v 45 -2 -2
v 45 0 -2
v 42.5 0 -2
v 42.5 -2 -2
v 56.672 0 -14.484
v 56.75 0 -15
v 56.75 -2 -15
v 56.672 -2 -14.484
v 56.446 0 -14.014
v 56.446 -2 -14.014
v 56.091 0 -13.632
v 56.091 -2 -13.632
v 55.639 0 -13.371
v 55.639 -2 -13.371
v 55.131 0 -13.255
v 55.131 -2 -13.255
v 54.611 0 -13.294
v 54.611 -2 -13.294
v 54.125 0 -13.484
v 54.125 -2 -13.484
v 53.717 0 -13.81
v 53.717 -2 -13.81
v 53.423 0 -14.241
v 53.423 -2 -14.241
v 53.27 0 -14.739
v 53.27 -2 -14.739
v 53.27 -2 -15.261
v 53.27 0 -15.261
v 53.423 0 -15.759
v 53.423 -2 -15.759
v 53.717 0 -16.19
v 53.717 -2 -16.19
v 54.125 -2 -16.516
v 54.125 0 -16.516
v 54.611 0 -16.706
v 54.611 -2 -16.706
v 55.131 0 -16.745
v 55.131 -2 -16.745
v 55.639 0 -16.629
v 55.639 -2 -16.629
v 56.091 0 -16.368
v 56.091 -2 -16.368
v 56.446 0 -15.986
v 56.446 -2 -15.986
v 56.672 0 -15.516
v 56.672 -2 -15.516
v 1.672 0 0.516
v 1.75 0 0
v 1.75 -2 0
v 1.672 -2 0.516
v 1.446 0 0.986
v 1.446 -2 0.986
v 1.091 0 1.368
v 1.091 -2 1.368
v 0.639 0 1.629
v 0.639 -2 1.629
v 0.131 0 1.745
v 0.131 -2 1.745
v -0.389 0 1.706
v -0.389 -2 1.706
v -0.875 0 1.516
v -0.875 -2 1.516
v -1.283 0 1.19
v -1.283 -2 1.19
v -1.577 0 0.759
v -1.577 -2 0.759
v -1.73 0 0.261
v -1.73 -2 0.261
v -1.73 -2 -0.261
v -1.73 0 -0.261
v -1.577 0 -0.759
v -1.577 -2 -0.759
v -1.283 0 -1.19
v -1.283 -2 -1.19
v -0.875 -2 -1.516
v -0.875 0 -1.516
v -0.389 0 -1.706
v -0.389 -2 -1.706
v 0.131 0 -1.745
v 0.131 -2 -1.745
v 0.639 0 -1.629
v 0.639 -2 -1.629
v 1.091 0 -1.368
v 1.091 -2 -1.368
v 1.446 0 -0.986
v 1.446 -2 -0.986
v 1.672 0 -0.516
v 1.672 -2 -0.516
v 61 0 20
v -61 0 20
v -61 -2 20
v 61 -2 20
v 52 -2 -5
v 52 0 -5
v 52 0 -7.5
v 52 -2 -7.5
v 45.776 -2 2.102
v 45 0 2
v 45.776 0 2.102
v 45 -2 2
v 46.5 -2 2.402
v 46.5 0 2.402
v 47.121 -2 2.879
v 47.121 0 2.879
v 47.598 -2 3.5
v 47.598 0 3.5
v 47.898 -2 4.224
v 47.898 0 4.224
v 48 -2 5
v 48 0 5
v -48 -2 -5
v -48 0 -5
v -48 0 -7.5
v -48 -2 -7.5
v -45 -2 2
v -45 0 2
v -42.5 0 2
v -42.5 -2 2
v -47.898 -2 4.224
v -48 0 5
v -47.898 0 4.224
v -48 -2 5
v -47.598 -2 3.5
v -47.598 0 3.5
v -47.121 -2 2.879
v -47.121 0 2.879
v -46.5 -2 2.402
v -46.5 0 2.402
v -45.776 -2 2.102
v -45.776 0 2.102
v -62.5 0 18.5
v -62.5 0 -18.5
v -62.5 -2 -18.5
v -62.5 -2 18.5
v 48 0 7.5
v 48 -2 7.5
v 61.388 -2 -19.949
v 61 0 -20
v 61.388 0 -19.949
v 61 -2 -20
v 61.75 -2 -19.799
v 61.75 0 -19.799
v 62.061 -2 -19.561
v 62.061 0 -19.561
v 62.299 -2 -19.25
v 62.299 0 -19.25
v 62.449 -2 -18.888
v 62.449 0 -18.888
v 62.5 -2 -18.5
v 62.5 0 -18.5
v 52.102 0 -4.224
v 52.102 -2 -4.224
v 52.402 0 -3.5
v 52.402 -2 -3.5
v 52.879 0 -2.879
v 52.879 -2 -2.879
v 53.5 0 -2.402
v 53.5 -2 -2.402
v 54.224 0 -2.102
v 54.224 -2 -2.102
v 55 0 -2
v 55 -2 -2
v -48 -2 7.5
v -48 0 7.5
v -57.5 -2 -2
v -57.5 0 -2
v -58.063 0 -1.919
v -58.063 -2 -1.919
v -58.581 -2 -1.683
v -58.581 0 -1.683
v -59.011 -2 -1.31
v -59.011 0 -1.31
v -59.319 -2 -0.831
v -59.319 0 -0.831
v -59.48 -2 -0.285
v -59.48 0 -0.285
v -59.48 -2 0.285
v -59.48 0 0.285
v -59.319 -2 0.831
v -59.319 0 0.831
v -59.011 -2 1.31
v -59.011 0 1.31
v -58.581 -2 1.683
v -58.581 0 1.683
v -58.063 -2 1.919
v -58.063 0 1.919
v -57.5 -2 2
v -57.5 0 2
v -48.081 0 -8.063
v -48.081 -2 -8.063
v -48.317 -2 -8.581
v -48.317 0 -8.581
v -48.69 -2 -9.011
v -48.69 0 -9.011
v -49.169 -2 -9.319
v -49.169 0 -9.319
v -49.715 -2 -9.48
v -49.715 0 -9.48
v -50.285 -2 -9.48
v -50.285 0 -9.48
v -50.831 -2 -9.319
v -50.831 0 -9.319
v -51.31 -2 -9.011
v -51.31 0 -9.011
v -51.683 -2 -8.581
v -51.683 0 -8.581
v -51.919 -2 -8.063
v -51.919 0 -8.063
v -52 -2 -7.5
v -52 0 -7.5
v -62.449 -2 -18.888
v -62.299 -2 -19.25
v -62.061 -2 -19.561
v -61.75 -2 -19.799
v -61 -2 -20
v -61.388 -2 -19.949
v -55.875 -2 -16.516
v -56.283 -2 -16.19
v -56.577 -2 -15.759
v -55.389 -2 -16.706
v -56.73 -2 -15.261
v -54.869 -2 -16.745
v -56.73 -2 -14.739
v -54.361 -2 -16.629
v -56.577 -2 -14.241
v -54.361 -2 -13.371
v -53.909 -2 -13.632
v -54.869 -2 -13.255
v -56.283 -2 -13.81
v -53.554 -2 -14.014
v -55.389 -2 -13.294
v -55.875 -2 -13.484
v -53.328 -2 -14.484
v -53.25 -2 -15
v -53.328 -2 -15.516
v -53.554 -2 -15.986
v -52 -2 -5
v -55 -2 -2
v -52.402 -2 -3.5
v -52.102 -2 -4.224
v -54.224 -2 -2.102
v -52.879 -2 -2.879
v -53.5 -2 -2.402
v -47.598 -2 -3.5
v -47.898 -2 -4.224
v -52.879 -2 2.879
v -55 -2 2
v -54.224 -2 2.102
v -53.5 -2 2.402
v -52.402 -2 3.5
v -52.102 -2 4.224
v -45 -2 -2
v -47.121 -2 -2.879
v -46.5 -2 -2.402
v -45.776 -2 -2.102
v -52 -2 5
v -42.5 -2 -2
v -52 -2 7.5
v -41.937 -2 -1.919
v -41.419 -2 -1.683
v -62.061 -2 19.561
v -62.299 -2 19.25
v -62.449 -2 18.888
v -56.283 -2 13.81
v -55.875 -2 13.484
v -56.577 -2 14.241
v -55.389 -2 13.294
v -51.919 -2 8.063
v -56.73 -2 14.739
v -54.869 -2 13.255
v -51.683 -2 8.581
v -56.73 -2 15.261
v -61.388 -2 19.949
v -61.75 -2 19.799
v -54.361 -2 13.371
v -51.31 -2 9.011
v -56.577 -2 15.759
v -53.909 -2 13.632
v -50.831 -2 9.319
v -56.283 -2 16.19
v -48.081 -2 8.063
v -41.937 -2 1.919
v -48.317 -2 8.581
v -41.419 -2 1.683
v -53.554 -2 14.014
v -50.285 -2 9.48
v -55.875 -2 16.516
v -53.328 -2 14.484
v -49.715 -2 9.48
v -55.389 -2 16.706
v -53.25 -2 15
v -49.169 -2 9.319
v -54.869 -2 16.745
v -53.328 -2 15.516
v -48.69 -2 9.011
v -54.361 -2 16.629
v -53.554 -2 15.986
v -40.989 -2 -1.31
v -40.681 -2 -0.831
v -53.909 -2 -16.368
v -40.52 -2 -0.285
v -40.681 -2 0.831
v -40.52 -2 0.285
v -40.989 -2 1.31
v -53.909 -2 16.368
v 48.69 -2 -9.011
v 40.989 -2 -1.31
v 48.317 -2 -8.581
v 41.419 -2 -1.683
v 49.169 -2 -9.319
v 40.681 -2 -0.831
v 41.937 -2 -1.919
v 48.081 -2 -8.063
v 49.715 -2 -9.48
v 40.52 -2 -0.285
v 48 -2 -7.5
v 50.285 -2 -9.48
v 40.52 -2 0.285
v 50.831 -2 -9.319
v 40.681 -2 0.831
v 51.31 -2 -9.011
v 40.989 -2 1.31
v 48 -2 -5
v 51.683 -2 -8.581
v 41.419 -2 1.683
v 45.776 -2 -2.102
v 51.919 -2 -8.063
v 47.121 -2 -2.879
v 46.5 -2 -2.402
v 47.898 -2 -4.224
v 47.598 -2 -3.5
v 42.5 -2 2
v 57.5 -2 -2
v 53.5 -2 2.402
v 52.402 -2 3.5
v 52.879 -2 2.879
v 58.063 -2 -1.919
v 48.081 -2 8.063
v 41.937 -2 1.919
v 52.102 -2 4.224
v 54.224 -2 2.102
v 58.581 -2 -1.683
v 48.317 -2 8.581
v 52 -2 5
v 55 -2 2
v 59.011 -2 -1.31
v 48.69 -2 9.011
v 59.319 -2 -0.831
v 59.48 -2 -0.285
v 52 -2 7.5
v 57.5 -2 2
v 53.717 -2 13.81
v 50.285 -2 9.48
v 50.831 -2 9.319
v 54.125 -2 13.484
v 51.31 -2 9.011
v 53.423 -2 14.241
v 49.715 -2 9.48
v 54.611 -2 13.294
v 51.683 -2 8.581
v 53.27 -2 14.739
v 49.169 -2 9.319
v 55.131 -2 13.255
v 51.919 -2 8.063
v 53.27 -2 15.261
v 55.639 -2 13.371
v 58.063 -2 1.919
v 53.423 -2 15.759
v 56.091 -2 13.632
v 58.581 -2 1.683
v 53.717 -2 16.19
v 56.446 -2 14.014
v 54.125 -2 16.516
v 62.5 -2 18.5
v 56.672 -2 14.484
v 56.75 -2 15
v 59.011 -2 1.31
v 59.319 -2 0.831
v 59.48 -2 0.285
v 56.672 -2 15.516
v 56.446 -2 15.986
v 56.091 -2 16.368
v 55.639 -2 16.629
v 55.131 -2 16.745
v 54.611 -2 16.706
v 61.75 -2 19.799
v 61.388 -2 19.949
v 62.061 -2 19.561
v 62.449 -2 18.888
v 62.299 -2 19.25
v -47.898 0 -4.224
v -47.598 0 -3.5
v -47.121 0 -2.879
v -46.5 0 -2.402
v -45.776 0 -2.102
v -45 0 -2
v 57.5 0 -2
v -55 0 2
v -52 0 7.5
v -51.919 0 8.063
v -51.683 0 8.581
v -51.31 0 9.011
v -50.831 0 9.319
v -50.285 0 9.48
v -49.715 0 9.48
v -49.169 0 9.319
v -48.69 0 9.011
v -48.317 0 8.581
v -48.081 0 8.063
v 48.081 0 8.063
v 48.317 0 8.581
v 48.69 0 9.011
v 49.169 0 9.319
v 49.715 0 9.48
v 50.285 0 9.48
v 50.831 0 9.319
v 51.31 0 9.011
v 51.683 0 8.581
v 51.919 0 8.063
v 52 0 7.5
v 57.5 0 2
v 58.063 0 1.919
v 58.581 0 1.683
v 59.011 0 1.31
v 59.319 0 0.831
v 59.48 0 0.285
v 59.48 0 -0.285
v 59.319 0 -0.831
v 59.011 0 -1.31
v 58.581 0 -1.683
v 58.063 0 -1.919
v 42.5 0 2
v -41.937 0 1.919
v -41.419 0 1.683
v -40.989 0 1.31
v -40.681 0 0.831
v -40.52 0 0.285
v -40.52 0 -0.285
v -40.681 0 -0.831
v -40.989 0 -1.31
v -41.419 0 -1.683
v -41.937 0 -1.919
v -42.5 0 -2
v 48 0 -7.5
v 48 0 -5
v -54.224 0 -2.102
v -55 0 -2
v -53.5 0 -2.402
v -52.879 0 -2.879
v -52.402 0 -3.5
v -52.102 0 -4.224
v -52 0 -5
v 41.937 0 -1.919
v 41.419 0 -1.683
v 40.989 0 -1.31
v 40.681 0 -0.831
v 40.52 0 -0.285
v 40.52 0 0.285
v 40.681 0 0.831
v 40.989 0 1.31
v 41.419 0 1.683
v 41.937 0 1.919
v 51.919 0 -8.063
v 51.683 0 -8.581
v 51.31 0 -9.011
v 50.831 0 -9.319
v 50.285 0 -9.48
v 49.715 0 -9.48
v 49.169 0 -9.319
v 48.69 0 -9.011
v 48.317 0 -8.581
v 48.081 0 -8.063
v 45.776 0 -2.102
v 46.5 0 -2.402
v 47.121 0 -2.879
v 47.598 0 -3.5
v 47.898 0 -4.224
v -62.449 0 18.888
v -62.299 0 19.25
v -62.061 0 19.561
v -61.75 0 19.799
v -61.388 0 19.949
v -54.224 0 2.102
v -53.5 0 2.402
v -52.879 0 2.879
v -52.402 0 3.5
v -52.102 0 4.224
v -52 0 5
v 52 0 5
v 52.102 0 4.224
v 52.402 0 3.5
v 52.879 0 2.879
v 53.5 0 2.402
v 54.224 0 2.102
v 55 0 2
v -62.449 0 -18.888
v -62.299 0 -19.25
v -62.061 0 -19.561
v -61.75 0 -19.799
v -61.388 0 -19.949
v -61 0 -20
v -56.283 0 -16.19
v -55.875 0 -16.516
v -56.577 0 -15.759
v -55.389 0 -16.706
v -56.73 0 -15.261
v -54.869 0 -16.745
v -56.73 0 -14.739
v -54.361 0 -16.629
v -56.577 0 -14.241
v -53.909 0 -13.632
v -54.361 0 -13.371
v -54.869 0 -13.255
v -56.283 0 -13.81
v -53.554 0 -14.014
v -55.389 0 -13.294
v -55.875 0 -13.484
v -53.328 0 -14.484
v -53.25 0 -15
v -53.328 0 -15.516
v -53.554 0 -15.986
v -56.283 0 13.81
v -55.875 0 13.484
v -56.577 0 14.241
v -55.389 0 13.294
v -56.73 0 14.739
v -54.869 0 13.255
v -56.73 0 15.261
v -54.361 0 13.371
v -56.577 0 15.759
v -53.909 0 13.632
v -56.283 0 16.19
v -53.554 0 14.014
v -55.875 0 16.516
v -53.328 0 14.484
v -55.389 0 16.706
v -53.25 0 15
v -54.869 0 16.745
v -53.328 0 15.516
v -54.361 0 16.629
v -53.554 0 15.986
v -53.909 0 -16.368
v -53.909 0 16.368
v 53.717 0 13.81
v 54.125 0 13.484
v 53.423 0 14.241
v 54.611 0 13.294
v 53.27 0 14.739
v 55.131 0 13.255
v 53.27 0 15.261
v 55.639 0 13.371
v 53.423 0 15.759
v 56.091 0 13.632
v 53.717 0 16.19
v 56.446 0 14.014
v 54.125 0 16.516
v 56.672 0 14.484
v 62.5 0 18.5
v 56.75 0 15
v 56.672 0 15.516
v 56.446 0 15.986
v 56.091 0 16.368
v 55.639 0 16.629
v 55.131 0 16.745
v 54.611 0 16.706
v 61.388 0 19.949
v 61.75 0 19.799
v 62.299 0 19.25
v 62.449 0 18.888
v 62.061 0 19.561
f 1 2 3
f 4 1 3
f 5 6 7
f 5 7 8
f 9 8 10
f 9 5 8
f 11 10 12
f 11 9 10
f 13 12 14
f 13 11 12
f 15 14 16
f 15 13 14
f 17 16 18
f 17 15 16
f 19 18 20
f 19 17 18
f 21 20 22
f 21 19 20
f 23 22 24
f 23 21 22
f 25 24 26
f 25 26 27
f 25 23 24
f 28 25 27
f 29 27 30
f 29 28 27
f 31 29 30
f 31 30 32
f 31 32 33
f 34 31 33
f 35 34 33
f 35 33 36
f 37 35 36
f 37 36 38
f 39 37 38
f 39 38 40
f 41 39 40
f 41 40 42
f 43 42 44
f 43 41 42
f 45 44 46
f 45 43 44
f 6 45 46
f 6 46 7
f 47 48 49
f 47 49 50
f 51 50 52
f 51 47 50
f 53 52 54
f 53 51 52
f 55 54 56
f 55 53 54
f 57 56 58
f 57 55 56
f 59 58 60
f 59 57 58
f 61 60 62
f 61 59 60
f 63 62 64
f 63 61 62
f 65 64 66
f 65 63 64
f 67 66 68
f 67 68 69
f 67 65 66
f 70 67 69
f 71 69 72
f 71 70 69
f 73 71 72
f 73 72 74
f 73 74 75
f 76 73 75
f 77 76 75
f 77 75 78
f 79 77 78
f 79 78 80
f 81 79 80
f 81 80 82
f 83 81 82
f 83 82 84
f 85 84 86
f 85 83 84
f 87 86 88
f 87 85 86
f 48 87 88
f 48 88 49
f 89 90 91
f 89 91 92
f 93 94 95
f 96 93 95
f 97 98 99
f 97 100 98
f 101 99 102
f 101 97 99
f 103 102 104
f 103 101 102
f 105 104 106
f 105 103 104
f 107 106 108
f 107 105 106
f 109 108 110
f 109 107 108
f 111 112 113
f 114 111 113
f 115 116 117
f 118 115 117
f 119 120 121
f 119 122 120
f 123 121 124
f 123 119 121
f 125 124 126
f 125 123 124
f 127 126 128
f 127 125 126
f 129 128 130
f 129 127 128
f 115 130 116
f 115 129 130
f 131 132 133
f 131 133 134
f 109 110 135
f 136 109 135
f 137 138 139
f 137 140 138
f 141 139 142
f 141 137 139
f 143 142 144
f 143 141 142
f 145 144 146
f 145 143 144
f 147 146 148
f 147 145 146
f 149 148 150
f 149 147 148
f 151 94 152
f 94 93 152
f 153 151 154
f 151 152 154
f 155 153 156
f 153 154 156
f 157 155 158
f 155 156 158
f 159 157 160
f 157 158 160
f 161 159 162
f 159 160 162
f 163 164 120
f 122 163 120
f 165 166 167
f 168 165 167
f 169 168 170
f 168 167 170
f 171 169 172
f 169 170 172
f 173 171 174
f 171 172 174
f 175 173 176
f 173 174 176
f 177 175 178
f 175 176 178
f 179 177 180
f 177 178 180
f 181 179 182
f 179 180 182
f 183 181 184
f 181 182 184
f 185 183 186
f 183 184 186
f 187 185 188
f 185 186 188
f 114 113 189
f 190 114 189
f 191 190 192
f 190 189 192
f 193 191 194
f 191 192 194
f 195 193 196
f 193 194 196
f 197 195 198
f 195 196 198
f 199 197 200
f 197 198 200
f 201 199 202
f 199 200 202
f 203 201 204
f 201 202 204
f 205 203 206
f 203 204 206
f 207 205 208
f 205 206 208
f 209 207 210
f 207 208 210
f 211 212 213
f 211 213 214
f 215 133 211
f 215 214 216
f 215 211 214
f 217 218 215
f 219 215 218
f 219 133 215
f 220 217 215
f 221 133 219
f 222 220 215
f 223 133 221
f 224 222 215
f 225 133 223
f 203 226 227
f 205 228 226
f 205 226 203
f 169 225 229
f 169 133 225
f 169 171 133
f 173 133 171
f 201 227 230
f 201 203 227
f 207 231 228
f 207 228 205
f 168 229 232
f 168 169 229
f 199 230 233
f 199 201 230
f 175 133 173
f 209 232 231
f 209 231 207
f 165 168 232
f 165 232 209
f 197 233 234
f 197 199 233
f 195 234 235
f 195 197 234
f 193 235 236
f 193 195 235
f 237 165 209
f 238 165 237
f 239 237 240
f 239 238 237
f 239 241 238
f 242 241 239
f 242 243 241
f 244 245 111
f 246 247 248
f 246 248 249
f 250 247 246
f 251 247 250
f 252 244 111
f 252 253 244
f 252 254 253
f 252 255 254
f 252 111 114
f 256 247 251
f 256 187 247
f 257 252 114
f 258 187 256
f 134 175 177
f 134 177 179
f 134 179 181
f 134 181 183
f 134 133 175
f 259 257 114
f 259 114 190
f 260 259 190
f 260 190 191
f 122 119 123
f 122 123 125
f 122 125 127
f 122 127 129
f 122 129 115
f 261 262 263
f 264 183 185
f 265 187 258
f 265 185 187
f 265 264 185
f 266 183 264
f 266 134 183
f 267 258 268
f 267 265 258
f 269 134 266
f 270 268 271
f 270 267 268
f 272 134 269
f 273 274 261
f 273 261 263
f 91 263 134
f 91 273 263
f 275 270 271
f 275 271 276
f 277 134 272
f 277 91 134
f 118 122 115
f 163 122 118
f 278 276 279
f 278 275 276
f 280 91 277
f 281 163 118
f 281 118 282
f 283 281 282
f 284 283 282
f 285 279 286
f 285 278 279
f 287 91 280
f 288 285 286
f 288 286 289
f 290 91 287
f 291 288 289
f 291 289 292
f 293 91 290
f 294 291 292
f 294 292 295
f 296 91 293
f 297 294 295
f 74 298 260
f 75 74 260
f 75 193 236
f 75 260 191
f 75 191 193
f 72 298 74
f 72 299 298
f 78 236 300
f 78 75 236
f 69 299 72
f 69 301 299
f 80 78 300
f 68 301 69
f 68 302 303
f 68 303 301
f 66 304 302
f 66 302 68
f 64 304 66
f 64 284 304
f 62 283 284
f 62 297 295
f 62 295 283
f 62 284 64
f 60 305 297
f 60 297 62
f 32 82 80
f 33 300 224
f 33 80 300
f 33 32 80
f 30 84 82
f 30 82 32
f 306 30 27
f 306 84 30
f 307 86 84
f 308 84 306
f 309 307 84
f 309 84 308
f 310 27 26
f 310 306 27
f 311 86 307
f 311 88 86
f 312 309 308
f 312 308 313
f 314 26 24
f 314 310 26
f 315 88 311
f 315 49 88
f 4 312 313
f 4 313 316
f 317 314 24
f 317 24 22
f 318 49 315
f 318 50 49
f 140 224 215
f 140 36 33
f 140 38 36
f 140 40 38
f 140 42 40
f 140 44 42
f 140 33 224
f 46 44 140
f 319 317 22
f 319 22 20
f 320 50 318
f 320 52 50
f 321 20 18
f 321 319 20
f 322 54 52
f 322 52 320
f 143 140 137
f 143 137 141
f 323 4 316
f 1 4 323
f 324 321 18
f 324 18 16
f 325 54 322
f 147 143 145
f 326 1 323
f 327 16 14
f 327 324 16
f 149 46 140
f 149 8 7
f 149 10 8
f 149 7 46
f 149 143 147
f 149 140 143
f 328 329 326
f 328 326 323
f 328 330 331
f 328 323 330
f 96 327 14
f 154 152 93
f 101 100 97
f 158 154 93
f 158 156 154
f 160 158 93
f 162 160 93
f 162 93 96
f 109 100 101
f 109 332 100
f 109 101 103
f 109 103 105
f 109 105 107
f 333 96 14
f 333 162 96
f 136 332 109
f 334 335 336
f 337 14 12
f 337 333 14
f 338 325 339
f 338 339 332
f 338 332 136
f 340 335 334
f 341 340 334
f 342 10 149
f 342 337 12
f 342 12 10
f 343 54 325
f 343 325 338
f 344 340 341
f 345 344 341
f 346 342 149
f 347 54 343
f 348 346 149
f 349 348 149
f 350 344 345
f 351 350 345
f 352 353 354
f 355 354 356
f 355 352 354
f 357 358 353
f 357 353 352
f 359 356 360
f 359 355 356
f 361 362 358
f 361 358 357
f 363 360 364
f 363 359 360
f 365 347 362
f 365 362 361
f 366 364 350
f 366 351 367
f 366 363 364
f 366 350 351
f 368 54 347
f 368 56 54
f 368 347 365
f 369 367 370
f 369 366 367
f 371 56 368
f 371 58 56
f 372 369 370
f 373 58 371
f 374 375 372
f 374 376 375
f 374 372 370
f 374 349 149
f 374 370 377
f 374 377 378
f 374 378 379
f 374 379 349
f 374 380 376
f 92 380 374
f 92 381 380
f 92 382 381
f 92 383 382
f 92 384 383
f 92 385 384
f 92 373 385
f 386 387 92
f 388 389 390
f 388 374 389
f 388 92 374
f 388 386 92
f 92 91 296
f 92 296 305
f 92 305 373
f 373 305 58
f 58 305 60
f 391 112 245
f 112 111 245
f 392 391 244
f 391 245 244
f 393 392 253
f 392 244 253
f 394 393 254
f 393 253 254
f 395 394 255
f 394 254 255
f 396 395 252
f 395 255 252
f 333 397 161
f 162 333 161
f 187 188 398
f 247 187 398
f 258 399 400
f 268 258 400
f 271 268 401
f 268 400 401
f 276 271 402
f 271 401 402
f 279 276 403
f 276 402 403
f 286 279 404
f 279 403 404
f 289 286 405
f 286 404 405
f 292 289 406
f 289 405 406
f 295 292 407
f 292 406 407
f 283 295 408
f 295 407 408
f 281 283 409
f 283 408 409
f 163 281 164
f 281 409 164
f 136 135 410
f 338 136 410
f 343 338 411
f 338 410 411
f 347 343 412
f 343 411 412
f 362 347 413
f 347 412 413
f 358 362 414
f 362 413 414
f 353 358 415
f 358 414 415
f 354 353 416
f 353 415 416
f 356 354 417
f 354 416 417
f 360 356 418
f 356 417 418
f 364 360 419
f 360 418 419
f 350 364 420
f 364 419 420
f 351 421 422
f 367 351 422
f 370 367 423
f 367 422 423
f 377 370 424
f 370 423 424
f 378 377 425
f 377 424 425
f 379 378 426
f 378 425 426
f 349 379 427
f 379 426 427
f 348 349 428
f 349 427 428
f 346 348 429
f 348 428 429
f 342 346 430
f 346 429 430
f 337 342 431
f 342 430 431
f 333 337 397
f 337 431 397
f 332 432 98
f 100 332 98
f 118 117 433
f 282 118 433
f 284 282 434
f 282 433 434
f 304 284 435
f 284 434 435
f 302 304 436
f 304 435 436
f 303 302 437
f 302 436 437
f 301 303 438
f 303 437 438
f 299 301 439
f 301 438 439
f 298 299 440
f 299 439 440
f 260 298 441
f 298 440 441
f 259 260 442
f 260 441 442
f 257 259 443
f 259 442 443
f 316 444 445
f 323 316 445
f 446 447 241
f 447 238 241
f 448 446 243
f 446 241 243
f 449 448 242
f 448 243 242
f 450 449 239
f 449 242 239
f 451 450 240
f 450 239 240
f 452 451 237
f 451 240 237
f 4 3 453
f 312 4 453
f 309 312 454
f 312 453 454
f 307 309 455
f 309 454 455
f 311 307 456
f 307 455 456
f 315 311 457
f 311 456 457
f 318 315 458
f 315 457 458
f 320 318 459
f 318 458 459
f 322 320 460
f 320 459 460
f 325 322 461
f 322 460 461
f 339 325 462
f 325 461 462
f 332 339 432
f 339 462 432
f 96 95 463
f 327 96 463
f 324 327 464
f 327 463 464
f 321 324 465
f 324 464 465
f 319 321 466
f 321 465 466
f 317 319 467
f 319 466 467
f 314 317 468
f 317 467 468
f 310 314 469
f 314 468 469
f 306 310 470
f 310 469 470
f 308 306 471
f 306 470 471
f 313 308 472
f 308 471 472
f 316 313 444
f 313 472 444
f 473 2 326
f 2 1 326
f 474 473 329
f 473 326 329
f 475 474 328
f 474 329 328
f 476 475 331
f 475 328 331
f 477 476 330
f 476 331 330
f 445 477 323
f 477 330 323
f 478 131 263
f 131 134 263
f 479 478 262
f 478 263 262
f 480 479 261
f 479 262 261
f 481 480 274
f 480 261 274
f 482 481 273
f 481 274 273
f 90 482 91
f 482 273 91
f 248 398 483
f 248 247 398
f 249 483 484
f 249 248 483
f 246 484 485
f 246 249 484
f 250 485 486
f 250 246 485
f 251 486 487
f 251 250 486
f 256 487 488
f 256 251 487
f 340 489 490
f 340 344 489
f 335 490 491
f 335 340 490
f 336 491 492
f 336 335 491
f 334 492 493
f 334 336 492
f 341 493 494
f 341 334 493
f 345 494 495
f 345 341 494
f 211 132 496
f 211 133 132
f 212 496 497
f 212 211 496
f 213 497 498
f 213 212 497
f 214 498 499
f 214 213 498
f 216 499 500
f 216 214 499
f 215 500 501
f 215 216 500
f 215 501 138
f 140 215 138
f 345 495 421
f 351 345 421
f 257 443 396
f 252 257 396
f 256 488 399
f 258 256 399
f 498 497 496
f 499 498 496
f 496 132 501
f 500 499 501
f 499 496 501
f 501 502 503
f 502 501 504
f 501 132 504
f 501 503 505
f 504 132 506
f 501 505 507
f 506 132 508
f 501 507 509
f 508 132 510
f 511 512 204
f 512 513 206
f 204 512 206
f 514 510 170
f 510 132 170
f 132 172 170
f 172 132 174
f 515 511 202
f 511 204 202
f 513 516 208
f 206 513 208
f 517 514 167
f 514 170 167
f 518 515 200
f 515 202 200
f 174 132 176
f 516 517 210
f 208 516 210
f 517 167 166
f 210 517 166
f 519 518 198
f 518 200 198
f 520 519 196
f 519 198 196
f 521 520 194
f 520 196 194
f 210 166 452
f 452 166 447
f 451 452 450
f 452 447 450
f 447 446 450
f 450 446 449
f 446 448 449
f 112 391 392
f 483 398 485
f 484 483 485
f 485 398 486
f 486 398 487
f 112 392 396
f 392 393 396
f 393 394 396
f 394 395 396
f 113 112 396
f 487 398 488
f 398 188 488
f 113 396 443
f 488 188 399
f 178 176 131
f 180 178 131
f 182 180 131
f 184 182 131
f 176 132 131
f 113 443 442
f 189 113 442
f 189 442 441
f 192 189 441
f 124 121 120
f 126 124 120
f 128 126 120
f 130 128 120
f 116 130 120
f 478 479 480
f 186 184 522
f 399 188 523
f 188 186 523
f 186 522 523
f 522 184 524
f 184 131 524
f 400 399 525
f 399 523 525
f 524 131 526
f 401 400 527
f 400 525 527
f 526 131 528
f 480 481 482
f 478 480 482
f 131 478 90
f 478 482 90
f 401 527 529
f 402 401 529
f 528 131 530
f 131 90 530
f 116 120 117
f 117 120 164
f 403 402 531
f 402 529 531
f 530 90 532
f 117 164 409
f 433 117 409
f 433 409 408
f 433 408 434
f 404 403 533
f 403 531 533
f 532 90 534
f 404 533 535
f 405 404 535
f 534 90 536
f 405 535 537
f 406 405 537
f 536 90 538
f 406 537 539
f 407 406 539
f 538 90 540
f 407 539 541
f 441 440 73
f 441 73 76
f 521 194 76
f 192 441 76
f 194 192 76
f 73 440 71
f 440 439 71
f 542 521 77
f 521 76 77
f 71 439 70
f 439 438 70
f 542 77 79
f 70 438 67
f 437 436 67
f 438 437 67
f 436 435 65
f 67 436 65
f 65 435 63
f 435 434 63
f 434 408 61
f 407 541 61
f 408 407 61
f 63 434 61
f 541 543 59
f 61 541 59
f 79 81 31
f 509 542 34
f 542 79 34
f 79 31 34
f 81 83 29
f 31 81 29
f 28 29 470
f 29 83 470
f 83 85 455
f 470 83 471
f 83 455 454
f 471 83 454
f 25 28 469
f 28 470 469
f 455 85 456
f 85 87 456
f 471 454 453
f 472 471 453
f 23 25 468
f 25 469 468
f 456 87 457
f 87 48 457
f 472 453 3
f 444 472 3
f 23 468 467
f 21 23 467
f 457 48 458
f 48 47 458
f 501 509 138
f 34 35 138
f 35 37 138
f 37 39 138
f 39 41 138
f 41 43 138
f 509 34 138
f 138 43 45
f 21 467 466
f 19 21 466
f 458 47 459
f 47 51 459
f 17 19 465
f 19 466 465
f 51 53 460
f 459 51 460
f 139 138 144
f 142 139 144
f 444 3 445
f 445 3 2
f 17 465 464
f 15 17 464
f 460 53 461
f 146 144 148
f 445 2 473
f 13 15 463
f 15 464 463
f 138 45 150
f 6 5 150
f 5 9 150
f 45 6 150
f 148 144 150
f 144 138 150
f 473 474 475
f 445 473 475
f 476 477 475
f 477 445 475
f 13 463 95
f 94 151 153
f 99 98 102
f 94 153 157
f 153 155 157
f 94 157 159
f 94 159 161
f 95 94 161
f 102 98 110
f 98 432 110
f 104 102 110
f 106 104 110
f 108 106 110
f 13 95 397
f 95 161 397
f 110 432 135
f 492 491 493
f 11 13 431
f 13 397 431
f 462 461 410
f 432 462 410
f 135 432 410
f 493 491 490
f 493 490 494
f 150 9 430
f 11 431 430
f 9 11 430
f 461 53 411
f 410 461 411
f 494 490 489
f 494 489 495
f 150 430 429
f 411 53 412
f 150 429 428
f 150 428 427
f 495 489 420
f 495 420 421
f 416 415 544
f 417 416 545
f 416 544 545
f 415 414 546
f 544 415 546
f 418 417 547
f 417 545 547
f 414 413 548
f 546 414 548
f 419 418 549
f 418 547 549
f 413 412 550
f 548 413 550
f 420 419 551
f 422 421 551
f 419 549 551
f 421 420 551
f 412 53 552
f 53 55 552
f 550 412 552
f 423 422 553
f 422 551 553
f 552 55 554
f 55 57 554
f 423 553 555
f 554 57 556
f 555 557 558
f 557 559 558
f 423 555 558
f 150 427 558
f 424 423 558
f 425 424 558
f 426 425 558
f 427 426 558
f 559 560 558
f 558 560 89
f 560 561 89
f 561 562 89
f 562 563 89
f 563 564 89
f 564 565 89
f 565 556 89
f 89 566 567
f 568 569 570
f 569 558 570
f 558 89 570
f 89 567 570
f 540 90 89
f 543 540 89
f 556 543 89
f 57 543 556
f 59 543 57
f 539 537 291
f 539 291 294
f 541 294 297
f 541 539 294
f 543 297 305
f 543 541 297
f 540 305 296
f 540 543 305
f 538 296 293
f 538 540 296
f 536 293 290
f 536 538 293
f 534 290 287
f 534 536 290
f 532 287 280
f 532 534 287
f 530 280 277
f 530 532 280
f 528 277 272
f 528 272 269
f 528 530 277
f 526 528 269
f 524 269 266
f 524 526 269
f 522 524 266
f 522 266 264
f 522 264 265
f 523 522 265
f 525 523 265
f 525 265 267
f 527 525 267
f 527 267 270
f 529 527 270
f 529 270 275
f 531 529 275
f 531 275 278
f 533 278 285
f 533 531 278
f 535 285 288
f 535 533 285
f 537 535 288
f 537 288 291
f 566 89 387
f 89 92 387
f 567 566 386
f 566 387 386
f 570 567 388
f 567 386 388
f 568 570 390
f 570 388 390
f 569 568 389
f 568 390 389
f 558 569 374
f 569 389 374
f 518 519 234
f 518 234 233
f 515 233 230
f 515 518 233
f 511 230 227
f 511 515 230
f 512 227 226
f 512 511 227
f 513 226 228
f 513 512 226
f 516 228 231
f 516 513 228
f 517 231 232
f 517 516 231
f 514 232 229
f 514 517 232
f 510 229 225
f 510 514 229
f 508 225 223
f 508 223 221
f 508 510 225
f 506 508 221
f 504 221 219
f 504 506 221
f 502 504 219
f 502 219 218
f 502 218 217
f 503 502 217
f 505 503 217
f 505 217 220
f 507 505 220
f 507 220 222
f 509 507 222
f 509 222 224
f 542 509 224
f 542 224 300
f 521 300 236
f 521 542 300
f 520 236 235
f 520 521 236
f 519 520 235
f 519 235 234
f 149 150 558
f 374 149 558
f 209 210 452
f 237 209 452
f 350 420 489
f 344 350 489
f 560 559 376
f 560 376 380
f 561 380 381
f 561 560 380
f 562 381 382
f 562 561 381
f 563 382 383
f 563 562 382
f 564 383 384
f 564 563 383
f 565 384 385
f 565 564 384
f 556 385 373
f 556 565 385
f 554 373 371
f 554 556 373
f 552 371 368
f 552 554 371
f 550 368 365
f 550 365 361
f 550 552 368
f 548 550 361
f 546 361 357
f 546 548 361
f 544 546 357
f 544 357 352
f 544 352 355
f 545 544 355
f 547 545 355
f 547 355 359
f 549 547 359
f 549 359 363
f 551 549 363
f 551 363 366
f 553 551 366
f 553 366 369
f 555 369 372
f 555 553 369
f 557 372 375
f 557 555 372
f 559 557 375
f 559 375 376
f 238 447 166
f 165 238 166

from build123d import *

# Parameters (mm, degrees)
F0_W     = 125
F0_H     = 40
F0_R     = 1.75
F1_DEPTH = 2
F2_R     = 1.5
F3_R     = 3


# Not quite as in the source:
# - a feature names something its author has since deleted; it is built from what else it names


with BuildPart() as f1:
    # F0 (on Front) → F1 (new body)
    with BuildSketch(Plane.XZ):
        Rectangle(F0_W, F0_H)
        with Locations((-55, -15)):
            Circle(F0_R, mode=Mode.SUBTRACT)
        with Locations((55, -15)):
            Circle(F0_R, mode=Mode.SUBTRACT)
        with BuildLine():
            Line((-57.5, 2), (-52, 2))
            Line((-52, 2), (-52, 7.5))
            ThreePointArc((-52, 7.5), (-50, 9.5), (-48, 7.5))
            Line((-48, 7.5), (-48, 2))
            Line((-48, 2), (-42.5, 2))
            ThreePointArc((-42.5, 2), (-40.5, 0), (-42.5, -2))
            Line((-42.5, -2), (-48, -2))
            Line((-48, -2), (-48, -7.5))
            ThreePointArc((-48, -7.5), (-50, -9.5), (-52, -7.5))
            Line((-52, -7.5), (-52, -2))
            Line((-52, -2), (-57.5, -2))
            ThreePointArc((-57.5, -2), (-59.5, 0), (-57.5, 2))
        make_face(mode=Mode.SUBTRACT)
        with Locations((-55, 15)):
            Circle(F0_R, mode=Mode.SUBTRACT)
        Circle(F0_R, mode=Mode.SUBTRACT)
        with BuildLine():
            Line((42.5, 2), (48, 2))
            Line((48, 2), (48, 7.5))
            ThreePointArc((48, 7.5), (50, 9.5), (52, 7.5))
            Line((52, 7.5), (52, 2))
            Line((52, 2), (57.5, 2))
            ThreePointArc((57.5, 2), (59.5, 0), (57.5, -2))
            Line((57.5, -2), (52, -2))
            Line((52, -2), (52, -7.5))
            ThreePointArc((52, -7.5), (50, -9.5), (48, -7.5))
            Line((48, -7.5), (48, -2))
            Line((48, -2), (42.5, -2))
            ThreePointArc((42.5, -2), (40.5, 0), (42.5, 2))
        make_face(mode=Mode.SUBTRACT)
        with Locations((55, 15)):
            Circle(F0_R, mode=Mode.SUBTRACT)
    extrude(amount=F1_DEPTH)

    # F2
    f2_edges = [f1.edges().sort_by_distance(p)[0] for p in [
        (-62.5, -1, 20),
        (62.5, -1, 20),
        (-62.5, -1, -20),
        (62.5, -1, -20),
    ]]
    fillet(f2_edges, radius=F2_R)

    # F3
    f3_edges = [f1.edges().sort_by_distance(p)[0] for p in [
        (-48, -1, 2),
        (-52, -1, 2),
        (-52, -1, -2),
        (-48, -1, -2),
        (52, -1, 2),
        (48, -1, 2),
        (48, -1, -2),
        (52, -1, -2),
    ]]
    fillet(f3_edges, radius=F3_R)


solid = f1.part
